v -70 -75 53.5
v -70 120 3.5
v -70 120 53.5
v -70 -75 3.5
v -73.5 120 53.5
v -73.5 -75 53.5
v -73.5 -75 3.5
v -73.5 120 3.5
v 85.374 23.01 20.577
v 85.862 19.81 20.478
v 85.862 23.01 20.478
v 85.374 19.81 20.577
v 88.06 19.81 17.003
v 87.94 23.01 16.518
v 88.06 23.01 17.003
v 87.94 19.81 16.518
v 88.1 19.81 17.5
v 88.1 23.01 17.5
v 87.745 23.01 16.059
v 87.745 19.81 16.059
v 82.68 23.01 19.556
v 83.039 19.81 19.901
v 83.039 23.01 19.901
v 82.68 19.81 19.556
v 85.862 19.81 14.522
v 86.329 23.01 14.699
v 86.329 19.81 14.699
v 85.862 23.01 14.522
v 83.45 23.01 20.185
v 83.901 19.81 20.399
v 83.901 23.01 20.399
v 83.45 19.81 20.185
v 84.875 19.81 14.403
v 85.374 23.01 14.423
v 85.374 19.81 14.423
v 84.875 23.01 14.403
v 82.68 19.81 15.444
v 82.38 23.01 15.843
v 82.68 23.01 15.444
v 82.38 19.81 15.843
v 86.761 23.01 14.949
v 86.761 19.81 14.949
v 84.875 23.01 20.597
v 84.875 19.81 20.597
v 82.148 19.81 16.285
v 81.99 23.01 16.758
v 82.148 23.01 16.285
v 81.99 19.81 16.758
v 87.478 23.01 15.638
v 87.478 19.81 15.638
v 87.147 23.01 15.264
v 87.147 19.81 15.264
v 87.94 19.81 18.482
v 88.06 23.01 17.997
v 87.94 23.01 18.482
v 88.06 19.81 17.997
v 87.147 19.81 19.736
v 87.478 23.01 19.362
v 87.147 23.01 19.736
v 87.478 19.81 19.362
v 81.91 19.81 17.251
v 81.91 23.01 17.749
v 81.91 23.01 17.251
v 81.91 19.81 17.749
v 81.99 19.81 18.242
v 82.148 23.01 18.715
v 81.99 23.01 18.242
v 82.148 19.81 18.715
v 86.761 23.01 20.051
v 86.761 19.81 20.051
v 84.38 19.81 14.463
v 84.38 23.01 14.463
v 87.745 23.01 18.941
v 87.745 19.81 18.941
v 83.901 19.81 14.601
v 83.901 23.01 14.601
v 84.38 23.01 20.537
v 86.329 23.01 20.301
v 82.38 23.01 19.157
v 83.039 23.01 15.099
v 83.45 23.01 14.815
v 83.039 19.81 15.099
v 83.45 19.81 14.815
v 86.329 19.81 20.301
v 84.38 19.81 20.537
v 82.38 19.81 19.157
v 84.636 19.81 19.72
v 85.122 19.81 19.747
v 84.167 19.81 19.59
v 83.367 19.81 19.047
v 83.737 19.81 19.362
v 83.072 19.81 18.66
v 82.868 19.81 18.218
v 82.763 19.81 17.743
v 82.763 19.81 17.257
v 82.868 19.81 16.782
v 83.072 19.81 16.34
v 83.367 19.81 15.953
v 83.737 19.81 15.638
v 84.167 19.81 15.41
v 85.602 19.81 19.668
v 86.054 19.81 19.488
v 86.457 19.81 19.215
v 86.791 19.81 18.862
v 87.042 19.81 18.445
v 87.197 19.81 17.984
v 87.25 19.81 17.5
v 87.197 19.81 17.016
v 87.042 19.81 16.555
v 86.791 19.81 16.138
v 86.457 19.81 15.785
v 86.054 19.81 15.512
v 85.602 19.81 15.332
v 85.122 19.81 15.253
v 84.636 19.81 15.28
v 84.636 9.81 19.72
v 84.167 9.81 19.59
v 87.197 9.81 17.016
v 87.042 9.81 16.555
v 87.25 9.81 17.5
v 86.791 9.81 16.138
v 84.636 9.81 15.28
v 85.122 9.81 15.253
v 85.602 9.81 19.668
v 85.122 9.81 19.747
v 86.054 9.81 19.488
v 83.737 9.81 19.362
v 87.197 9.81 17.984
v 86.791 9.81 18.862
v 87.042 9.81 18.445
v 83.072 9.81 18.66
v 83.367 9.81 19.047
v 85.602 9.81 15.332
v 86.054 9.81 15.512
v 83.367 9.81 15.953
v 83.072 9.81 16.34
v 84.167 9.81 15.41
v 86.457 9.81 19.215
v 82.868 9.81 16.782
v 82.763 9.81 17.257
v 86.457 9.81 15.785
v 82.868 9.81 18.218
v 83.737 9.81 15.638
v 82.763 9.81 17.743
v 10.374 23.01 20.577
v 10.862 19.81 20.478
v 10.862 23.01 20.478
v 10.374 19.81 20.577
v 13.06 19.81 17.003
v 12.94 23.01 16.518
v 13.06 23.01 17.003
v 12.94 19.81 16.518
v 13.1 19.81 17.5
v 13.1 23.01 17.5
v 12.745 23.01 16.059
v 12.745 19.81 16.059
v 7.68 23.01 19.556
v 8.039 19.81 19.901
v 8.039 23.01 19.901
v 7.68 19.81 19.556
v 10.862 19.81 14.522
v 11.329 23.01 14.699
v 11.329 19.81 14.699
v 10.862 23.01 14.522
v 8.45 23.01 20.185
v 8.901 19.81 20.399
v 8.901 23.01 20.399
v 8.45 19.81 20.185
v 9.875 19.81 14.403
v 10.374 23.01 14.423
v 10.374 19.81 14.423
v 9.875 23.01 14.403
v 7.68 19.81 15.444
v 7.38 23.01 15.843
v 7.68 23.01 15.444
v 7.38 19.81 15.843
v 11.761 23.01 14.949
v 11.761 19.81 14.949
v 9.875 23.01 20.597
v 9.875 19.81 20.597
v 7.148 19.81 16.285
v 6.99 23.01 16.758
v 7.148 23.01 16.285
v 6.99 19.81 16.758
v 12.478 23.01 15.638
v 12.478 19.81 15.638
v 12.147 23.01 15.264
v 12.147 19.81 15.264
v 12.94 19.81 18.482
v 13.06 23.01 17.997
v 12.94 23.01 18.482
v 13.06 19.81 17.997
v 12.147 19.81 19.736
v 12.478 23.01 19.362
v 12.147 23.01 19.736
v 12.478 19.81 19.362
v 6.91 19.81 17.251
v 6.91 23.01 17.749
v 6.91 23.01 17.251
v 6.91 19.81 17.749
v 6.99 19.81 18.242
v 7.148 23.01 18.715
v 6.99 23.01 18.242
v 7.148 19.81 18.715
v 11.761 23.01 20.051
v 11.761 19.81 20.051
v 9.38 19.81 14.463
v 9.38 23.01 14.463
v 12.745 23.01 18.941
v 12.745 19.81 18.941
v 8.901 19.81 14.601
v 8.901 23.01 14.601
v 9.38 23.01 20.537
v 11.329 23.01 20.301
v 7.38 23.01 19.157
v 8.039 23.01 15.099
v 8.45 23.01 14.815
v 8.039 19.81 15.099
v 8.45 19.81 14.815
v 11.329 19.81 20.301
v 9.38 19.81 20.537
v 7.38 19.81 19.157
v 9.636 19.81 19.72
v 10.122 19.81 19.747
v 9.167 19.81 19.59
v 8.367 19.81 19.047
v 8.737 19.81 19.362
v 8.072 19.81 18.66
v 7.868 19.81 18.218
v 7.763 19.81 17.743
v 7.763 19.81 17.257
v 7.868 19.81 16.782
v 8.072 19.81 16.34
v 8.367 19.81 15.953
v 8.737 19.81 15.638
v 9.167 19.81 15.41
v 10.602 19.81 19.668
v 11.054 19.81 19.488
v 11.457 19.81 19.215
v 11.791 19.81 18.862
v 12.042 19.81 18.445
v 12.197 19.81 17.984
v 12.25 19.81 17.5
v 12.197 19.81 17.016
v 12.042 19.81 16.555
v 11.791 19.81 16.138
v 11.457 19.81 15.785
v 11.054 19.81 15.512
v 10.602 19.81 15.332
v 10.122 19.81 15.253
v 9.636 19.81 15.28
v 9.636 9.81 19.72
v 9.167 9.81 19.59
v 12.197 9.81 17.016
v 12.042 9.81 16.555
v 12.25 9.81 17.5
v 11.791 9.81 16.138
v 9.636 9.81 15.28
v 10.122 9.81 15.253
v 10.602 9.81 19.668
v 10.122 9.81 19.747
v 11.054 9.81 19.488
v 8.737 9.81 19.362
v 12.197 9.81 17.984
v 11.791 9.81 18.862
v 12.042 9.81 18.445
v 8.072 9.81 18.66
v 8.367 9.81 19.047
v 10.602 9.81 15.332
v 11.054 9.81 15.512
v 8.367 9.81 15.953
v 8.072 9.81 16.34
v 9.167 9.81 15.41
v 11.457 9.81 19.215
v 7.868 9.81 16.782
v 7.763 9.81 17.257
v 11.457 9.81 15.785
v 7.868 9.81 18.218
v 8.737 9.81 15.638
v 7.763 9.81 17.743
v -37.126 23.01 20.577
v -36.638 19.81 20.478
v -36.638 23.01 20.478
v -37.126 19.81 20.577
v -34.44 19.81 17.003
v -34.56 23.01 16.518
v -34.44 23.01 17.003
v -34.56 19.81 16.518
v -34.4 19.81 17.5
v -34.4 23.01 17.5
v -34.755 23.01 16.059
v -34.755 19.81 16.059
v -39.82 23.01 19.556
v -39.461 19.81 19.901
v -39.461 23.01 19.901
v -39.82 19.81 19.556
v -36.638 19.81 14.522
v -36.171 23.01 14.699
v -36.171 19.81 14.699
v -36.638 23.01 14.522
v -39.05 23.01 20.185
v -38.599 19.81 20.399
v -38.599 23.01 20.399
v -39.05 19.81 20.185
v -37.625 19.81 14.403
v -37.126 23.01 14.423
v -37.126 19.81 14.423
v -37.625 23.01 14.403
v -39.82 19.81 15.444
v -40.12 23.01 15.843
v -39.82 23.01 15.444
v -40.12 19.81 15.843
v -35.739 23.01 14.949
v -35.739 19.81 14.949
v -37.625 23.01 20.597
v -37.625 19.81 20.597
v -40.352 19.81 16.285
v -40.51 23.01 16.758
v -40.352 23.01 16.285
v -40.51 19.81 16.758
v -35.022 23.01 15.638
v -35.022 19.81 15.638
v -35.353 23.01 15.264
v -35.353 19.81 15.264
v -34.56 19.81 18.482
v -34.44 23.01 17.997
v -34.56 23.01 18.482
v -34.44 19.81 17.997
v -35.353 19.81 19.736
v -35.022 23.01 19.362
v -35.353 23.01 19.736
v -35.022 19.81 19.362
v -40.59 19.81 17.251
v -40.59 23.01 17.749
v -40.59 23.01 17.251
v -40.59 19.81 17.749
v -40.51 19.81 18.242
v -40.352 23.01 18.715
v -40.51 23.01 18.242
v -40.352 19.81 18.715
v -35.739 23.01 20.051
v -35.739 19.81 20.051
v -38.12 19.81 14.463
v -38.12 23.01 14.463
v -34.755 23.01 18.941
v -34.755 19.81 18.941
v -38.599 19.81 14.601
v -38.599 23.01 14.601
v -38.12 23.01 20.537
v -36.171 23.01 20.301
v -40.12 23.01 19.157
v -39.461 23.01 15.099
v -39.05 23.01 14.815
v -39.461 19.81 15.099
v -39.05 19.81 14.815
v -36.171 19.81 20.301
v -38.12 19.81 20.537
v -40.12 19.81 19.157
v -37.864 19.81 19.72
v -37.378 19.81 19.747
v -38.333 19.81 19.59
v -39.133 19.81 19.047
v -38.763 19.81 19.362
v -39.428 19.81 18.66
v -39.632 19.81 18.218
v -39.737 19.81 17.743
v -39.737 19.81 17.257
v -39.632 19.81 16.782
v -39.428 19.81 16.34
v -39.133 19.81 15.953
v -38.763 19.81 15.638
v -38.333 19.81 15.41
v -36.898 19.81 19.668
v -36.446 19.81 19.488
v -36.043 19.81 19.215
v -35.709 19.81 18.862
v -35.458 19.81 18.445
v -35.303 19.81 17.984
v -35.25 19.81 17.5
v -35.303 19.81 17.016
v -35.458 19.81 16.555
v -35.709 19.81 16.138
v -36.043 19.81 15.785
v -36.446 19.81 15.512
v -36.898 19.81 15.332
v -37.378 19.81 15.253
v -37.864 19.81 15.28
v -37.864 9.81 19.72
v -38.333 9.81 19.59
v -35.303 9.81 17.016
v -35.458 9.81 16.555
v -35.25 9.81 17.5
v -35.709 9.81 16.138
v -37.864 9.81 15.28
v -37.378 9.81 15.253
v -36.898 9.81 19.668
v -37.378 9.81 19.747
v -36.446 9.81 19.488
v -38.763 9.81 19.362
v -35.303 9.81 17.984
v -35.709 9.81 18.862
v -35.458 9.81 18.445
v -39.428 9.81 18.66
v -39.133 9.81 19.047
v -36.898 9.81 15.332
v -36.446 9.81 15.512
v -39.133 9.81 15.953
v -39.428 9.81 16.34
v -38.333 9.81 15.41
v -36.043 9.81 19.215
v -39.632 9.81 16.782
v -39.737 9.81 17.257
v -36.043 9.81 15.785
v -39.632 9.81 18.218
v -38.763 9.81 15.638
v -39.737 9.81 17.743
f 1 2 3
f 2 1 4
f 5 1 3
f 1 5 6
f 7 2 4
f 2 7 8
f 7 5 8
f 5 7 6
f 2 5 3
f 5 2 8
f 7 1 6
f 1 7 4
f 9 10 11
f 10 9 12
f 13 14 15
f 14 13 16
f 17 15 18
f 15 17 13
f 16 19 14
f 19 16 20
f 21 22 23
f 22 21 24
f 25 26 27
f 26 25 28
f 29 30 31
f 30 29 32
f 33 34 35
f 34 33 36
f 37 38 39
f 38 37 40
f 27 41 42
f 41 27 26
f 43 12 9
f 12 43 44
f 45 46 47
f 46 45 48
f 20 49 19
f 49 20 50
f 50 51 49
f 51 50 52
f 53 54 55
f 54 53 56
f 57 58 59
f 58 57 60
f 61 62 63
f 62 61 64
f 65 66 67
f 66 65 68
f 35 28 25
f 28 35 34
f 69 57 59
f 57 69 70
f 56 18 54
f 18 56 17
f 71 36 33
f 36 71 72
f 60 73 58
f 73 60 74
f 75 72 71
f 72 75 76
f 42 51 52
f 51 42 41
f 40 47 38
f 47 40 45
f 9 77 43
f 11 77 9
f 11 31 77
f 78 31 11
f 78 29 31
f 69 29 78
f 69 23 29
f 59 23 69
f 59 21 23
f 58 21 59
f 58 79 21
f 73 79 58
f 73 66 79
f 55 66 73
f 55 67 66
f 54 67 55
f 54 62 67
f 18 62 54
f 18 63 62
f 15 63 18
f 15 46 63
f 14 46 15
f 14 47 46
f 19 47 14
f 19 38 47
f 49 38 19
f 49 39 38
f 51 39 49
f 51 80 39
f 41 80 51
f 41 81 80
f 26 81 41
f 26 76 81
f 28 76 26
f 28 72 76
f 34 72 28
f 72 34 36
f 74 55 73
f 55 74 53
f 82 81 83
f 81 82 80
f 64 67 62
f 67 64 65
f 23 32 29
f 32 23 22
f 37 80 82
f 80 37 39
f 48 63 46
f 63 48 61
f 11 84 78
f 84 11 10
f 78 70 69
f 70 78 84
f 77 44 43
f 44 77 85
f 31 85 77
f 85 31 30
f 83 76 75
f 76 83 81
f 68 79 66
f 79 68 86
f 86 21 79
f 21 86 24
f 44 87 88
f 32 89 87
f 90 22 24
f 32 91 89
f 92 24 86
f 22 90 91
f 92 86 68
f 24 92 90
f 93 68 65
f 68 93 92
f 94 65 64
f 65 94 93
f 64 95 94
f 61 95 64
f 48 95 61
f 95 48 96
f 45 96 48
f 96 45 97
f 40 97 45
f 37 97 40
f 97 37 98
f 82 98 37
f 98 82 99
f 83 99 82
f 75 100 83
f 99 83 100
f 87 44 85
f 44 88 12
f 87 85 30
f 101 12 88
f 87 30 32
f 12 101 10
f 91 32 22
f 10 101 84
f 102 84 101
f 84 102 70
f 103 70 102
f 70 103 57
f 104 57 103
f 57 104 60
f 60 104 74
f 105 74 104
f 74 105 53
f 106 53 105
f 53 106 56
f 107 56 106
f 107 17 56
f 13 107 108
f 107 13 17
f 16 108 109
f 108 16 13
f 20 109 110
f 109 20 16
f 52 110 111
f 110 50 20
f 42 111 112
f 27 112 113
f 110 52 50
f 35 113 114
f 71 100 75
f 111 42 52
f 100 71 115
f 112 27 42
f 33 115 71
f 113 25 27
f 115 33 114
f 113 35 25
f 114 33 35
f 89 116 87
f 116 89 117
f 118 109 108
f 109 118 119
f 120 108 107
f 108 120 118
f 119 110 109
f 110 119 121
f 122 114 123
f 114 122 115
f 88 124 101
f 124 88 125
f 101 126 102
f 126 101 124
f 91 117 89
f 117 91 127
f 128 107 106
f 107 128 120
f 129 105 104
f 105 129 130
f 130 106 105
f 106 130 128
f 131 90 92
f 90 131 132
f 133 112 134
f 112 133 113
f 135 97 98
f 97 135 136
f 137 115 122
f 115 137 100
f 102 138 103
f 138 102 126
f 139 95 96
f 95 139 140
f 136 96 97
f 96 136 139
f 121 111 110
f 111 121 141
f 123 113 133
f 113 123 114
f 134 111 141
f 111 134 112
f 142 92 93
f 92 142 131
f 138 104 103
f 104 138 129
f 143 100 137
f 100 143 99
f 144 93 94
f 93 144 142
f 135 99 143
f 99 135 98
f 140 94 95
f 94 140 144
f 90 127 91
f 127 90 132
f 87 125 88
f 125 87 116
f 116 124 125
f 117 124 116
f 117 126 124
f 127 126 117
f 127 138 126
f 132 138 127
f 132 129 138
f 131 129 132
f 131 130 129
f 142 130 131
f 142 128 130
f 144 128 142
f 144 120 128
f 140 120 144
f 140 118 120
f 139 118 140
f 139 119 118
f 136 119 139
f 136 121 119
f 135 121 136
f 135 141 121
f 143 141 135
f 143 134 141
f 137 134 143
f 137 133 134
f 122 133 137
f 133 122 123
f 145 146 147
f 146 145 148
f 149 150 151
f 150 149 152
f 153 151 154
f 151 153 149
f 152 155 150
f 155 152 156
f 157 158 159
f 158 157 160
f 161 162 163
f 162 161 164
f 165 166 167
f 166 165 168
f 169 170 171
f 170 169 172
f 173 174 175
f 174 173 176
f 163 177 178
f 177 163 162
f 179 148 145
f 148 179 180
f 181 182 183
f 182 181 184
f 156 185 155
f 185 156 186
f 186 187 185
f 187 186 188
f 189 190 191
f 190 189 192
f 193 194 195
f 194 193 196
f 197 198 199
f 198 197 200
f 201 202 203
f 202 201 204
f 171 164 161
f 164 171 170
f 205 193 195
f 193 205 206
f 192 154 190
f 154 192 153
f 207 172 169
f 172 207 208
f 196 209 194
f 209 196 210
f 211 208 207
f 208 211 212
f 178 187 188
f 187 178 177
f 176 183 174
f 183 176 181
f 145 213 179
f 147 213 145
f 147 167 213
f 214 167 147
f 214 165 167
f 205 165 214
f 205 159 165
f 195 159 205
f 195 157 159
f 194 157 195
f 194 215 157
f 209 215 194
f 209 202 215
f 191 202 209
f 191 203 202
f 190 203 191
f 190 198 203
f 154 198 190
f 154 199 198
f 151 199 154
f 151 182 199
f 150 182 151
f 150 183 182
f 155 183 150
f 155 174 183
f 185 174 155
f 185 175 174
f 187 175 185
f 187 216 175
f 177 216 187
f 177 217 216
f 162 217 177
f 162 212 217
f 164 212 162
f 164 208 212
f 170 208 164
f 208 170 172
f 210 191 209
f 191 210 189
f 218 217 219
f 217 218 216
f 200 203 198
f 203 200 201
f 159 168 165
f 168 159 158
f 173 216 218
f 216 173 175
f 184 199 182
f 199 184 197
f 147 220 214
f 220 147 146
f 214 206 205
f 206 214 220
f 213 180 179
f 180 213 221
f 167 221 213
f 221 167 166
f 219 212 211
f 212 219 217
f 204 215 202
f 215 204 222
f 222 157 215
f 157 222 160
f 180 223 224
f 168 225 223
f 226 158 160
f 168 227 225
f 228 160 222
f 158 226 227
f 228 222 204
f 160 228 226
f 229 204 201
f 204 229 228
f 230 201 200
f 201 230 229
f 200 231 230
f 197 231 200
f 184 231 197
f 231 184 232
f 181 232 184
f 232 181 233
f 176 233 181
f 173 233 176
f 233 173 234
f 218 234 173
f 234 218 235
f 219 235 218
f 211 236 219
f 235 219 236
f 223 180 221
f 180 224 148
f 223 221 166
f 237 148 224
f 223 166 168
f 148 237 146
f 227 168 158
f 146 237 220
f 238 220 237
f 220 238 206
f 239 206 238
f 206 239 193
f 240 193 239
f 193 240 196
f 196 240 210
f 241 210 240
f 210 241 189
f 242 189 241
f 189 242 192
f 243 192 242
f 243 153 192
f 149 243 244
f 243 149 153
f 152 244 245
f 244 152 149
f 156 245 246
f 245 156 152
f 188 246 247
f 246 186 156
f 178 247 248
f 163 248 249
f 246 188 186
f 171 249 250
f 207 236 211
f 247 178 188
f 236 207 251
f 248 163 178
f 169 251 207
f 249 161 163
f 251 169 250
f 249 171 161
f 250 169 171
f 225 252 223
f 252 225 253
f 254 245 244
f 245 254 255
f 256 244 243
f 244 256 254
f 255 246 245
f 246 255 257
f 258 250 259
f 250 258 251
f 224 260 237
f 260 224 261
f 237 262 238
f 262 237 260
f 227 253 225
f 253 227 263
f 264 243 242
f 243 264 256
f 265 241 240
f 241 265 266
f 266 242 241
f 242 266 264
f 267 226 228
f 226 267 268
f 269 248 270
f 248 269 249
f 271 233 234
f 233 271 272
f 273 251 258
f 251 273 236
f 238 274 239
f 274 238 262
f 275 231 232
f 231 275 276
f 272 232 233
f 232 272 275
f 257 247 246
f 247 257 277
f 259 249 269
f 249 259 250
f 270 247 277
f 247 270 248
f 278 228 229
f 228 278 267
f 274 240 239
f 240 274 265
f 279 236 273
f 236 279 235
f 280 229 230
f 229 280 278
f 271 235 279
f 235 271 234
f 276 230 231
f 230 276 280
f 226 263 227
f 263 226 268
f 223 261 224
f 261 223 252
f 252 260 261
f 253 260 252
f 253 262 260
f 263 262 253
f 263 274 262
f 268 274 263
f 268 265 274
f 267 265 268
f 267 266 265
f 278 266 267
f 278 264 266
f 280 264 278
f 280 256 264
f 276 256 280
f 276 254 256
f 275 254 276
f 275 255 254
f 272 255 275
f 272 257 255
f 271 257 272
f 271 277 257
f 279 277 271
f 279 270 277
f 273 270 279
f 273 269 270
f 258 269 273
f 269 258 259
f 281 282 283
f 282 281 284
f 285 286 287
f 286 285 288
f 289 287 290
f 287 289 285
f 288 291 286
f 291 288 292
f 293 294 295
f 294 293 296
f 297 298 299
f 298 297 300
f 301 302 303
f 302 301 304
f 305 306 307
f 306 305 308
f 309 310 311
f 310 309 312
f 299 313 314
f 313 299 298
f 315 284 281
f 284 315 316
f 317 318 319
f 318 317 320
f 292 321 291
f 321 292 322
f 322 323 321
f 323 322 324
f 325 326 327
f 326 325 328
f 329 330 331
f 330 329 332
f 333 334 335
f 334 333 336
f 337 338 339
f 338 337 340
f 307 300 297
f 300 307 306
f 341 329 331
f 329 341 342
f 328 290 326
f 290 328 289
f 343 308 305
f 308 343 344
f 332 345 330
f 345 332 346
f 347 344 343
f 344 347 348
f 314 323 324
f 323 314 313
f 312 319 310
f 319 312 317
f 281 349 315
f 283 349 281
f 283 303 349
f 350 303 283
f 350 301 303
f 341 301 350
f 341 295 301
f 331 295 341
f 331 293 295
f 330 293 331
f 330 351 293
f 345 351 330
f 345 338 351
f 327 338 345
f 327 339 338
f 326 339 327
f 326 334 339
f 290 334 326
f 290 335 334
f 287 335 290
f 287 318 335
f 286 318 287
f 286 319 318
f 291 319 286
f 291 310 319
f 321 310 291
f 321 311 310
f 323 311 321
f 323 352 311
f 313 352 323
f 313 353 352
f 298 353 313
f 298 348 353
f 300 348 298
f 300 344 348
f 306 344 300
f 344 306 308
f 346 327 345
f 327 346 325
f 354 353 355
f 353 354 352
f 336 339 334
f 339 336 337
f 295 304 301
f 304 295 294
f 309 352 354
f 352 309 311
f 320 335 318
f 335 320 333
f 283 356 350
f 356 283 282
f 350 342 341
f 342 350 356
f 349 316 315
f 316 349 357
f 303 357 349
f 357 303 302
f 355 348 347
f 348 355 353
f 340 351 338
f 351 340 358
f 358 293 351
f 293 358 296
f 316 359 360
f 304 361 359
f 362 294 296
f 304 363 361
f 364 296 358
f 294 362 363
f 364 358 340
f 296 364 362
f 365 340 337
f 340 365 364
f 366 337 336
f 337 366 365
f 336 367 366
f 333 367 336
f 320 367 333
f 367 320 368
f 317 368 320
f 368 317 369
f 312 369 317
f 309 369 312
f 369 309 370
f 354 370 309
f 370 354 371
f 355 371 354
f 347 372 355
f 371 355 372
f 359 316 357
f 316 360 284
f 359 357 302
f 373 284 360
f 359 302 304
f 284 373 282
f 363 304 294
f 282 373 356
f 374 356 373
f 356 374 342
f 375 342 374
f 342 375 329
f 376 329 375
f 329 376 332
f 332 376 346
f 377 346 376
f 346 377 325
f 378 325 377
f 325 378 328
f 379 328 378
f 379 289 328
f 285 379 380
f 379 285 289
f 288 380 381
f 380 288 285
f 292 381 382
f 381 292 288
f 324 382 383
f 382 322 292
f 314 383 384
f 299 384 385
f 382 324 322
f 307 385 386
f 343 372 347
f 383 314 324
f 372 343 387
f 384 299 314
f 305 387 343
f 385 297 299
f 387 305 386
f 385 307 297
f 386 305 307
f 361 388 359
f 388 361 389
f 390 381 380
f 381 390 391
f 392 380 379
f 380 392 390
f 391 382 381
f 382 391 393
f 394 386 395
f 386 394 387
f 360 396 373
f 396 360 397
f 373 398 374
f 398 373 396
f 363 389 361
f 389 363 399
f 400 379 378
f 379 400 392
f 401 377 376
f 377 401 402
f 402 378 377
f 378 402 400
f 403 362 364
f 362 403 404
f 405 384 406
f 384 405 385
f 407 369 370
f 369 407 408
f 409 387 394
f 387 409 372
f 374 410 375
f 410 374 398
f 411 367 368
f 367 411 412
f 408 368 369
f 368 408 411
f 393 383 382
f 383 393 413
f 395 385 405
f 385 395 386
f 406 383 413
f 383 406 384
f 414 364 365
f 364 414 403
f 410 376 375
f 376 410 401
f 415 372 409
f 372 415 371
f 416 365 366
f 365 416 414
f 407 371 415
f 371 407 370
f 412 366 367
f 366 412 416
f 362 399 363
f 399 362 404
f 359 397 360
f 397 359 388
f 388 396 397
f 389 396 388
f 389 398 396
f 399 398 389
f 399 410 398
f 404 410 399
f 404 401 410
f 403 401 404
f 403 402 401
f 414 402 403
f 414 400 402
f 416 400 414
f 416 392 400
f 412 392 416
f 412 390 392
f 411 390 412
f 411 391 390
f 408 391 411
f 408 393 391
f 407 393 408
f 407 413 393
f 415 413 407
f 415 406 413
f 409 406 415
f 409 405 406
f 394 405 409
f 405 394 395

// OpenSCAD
// file: lib/Metric/Polygon.scad
//============================================================
// OpenSCAD
// Regular Convex Polygon Library
// Last Modified : 2015/10/28
//============================================================
/*

	Definition

	N = Number of Side N >=3
	A = apothem
		radius of inside circle
	R = circumradius
		Radius of outside circle
	S = Side
		Lenght of a side

	Build polygon with the Apothem :
	N and A is known
	Need to calculate S then R
	use $fn

	Build Polygon with Circumradius
	N and R known
	use $fn

	Build Polygon with Side
	N and S Known
	Need to calculate R and optionaly A
	use $fn	

	TO DO
    Control result

	For more information :
	http://en.wikipedia.org/wiki/Regular_polygon

*/

//------------------------------------------------------------
//
//------------------------------------------------------------
Demo();

//------------------------------------------------------------
// Demo
//------------------------------------------------------------
module Demo()
{
	inch = 25.4;	// 25.4mm
	// A = apothem - it's a RADIUS !
	// For a bolt of 4 inches spécify A=2*inch
	//Polygon(N=7,A=2*inch,h=0);	// 4 inches radius Polygon
	//Polygon(N=7,A=49.8365,h=0);
	//Trigon(A=50,h=10);			// N=3
	//Dodecagon(A=50,h=0);			// N=12

    //rotate([0,0,360/7/2])
	//Nonagon(R=55.3144,h=10,debug=true);

	//Polygon(N=6,A=60,h=0,debug=false);
	//Polygon(N=6,A=60,h=5,debug=true);

    Enneagon(A=50);
}


//------------------------------------------------------------
// Polygon : 
//------------------------------------------------------------
module Polygon(N=3,A=0,R=0,S=0,h=0,debug=false)
{
	N = ( N < 3 ? 3 : N );

	angle = 360/N;
	angleA = angle/2;

	if (debug)
	{
		echo("N = ", N);
		echo("A = ", A);
		echo("S = ", S);
		echo("R = ", R);
	}

	if ( A > 0 )		// if A assign R and S
	{
        S = 2 * A * tan(angleA);							// assign
		//R = (S/2) / sin(angleA);						// no assign ???
		R = ( A * tan(angleA) ) / sin(angleA);		// asign
		_Build_Polygon(N=N,R=R,h=h);
		if (debug)
		{
			echo("aN = ", N);
			echo("aA = ", A);
			echo("aS = ", S);
			echo("aR = ", R);
			#cylinder(r=A,h=h+1,center=true,$fn=150);
			%cylinder(r=R,h=h+1,center=true,$fn=150);
		}
	}
	else
	{
		if ( S > 0 )		// if S assign R and A
		{
			R = (S/2) / sin(angleA);			// assign
			A = S / ( 2 * tan(angleA) );		// assign
            _Build_Polygon(N=N,R=R,h=h);
			if (debug)
			{
				echo("sN = ", N);
				echo("sA = ", A);
				echo("sS = ", S);
				echo("sR = ", R);
				#cylinder(r=A,h=h+1,center=true,$fn=150);
				%cylinder(r=R,h=h+1,center=true,$fn=150);
			}
		}
		else
		{
			if ( R == 0 )		// default
			{
				S = 2 * R * sin(angleA);			// no assign ???
				A = S / ( 2 * tan(angleA) );		// no assign ???
				_Build_Polygon(N=N,h=h);
				if (debug)
				{
					echo("0N = ", N);
					echo("0A = ", A);
					echo("0S = ", S);
					echo("0R = ", R);
					#cylinder(r=A,h=h+1,center=true,$fn=150);
					%cylinder(r=R,h=h+1,center=true,$fn=150);
				}
			}
			else		// build with R
			{
				S = 2 * R * sin(angleA);
				A = S / ( 2 * tan(angleA) );			// no assign ???
				//A = R * ( sin(angleA) / tan(angleA) )	// no assign ???
				_Build_Polygon(N=N,R=R,h=h);
				if (debug)
				{
					echo("rN = ", N);
					echo("rA = ", A);
					echo("rS = ", S);
					echo("rR = ", R);
					%cylinder(r=R,h=h+1,center=true,$fn=150);
				}
			}
		}
	}

	if (debug)
	{
		echo("fN = ", N);
		echo("fA = ", A);
		echo("fS = ", S);
		echo("fR = ", R);
	}
}

//------------------------------------------------------------
// Build
//------------------------------------------------------------
module _Build_Polygon(N=3,R=1,h=0)
{
	if (h > 0)
	{
		// 3D primitive h>0
		cylinder(r=R,h=h,$fn=N,center=true);
	}
	else
	{
		// 2D primitive h=0
		circle(r=R,$fn=N,center=true);
	}
}

//------------------------------------------------------------
// Building lots from N=3, N=N+1
// http://en.wikipedia.org/wiki/Polygon
//------------------------------------------------------------

// 3 sides
module Trigon(A=0,R=0,S=0,h=0,debug=false)
	{Polygon(N=3,A=A,R=R,S=S,h=h,debug=debug);}

module Triangle(A=0,R=0,S=0,h=0,debug=false)
	{Polygon(N=3,A=A,R=R,S=S,h=h,debug=debug);}

// 4 sides
module Tetragon(A=0,R=0,S=0,h=0,debug=false)
	{Polygon(N=4,A=A,R=R,S=S,h=h,debug=debug);}

module Quadrilateral(A=0,R=0,S=0,h=0,debug=false)
	{Polygon(N=4,A=A,R=R,S=S,h=h,debug=debug);}

module Quadrangle(A=0,R=0,S=0,h=0,debug=false)
	{Polygon(N=4,A=A,R=R,S=S,h=h,debug=debug);}

// 5 sides
module Pentagon(A=0,R=0,S=0,h=0,debug=false)
	{Polygon(N=5,A=A,R=R,S=S,h=h,debug=debug);}

// 6 sides
module Hexagon(A=0,R=0,S=0,h=0,debug=false)
	{Polygon(N=6,A=A,R=R,S=S,h=h,debug=debug);}

// 7 sides
module Heptagon(A=0,R=0,S=0,h=0,debug=false)
	{Polygon(N=7,A=A,R=R,S=S,h=h,debug=debug);}

// 8 sides
module Octagon(A=0,R=0,S=0,h=0,debug=false)
	{Polygon(N=8,A=A,R=R,S=S,h=h,debug=debug);}

// 9 sides
module Enneagon(A=0,R=0,S=0,h=0,debug=false)
	{Polygon(N=9,A=A,R=R,S=S,h=h,debug=debug);}

module Nonagon(A=0,R=0,S=0,h=0,debug=false)
	{Polygon(N=9,A=A,R=R,S=S,h=h,debug=debug);}

// 10 sides
module Decagon(A=0,R=0,S=0,h=0,debug=false)
	{Polygon(N=10,A=A,R=R,S=S,h=h,debug=debug);}

// 11 sides
module Handecagon(A=0,R=0,S=0,h=0,debug=false)
	{Polygon(N=11,A=A,R=R,S=S,h=h,debug=debug);}

// 12 sides
module Dodecagon(A=0,R=0,S=0,h=0,debug=false)
	{Polygon(N=12,A=A,R=R,S=S,h=h,debug=debug);}

// ...

// 100 sides
module Hectogon(A=0,R=0,S=0,h=0,debug=false)
	{Polygon(N=100,A=A,R=R,S=S,h=h,debug=debug);}

//==EOF=======================================================
// file: Metric/Polygon.scad
//============================================================
// OpenSCAD
// Regular Convex Polygon Library
// Last Modified : 2015/10/28
//============================================================
/*

	Definition

	N = Number of Side N >=3
	A = apothem
		radius of inside circle
	R = circumradius
		Radius of outside circle
	S = Side
		Lenght of a side

	Build polygon with the Apothem :
	N and A is known
	Need to calculate S then R
	use $fn

	Build Polygon with Circumradius
	N and R known
	use $fn

	Build Polygon with Side
	N and S Known
	Need to calculate R and optionaly A
	use $fn	

	TO DO
    Control result

	For more information :
	http://en.wikipedia.org/wiki/Regular_polygon

*/

//------------------------------------------------------------
//
//------------------------------------------------------------
Demo();

//------------------------------------------------------------
// Demo
//------------------------------------------------------------
module Demo()
{
	inch = 25.4;	// 25.4mm
	// A = apothem - it's a RADIUS !
	// For a bolt of 4 inches spécify A=2*inch
	//Polygon(N=7,A=2*inch,h=0);	// 4 inches radius Polygon
	//Polygon(N=7,A=49.8365,h=0);
	//Trigon(A=50,h=10);			// N=3
	//Dodecagon(A=50,h=0);			// N=12

    //rotate([0,0,360/7/2])
	//Nonagon(R=55.3144,h=10,debug=true);

	//Polygon(N=6,A=60,h=0,debug=false);
	//Polygon(N=6,A=60,h=5,debug=true);

    Enneagon(A=50);
}


//------------------------------------------------------------
// Polygon : 
//------------------------------------------------------------
module Polygon(N=3,A=0,R=0,S=0,h=0,debug=false)
{
	N = ( N < 3 ? 3 : N );

	angle = 360/N;
	angleA = angle/2;

	if (debug)
	{
		echo("N = ", N);
		echo("A = ", A);
		echo("S = ", S);
		echo("R = ", R);
	}

	if ( A > 0 )		// if A assign R and S
	{
        S = 2 * A * tan(angleA);							// assign
		//R = (S/2) / sin(angleA);						// no assign ???
		R = ( A * tan(angleA) ) / sin(angleA);		// asign
		_Build_Polygon(N=N,R=R,h=h);
		if (debug)
		{
			echo("aN = ", N);
			echo("aA = ", A);
			echo("aS = ", S);
			echo("aR = ", R);
			#cylinder(r=A,h=h+1,center=true,$fn=150);
			%cylinder(r=R,h=h+1,center=true,$fn=150);
		}
	}
	else
	{
		if ( S > 0 )		// if S assign R and A
		{
			R = (S/2) / sin(angleA);			// assign
			A = S / ( 2 * tan(angleA) );		// assign
            _Build_Polygon(N=N,R=R,h=h);
			if (debug)
			{
				echo("sN = ", N);
				echo("sA = ", A);
				echo("sS = ", S);
				echo("sR = ", R);
				#cylinder(r=A,h=h+1,center=true,$fn=150);
				%cylinder(r=R,h=h+1,center=true,$fn=150);
			}
		}
		else
		{
			if ( R == 0 )		// default
			{
				S = 2 * R * sin(angleA);			// no assign ???
				A = S / ( 2 * tan(angleA) );		// no assign ???
				_Build_Polygon(N=N,h=h);
				if (debug)
				{
					echo("0N = ", N);
					echo("0A = ", A);
					echo("0S = ", S);
					echo("0R = ", R);
					#cylinder(r=A,h=h+1,center=true,$fn=150);
					%cylinder(r=R,h=h+1,center=true,$fn=150);
				}
			}
			else		// build with R
			{
				S = 2 * R * sin(angleA);
				A = S / ( 2 * tan(angleA) );			// no assign ???
				//A = R * ( sin(angleA) / tan(angleA) )	// no assign ???
				_Build_Polygon(N=N,R=R,h=h);
				if (debug)
				{
					echo("rN = ", N);
					echo("rA = ", A);
					echo("rS = ", S);
					echo("rR = ", R);
					%cylinder(r=R,h=h+1,center=true,$fn=150);
				}
			}
		}
	}

	if (debug)
	{
		echo("fN = ", N);
		echo("fA = ", A);
		echo("fS = ", S);
		echo("fR = ", R);
	}
}

//------------------------------------------------------------
// Build
//------------------------------------------------------------
module _Build_Polygon(N=3,R=1,h=0)
{
	if (h > 0)
	{
		// 3D primitive h>0
		cylinder(r=R,h=h,$fn=N,center=true);
	}
	else
	{
		// 2D primitive h=0
		circle(r=R,$fn=N,center=true);
	}
}

//------------------------------------------------------------
// Building lots from N=3, N=N+1
// http://en.wikipedia.org/wiki/Polygon
//------------------------------------------------------------

// 3 sides
module Trigon(A=0,R=0,S=0,h=0,debug=false)
	{Polygon(N=3,A=A,R=R,S=S,h=h,debug=debug);}

module Triangle(A=0,R=0,S=0,h=0,debug=false)
	{Polygon(N=3,A=A,R=R,S=S,h=h,debug=debug);}

// 4 sides
module Tetragon(A=0,R=0,S=0,h=0,debug=false)
	{Polygon(N=4,A=A,R=R,S=S,h=h,debug=debug);}

module Quadrilateral(A=0,R=0,S=0,h=0,debug=false)
	{Polygon(N=4,A=A,R=R,S=S,h=h,debug=debug);}

module Quadrangle(A=0,R=0,S=0,h=0,debug=false)
	{Polygon(N=4,A=A,R=R,S=S,h=h,debug=debug);}

// 5 sides
module Pentagon(A=0,R=0,S=0,h=0,debug=false)
	{Polygon(N=5,A=A,R=R,S=S,h=h,debug=debug);}

// 6 sides
module Hexagon(A=0,R=0,S=0,h=0,debug=false)
	{Polygon(N=6,A=A,R=R,S=S,h=h,debug=debug);}

// 7 sides
module Heptagon(A=0,R=0,S=0,h=0,debug=false)
	{Polygon(N=7,A=A,R=R,S=S,h=h,debug=debug);}

// 8 sides
module Octagon(A=0,R=0,S=0,h=0,debug=false)
	{Polygon(N=8,A=A,R=R,S=S,h=h,debug=debug);}

// 9 sides
module Enneagon(A=0,R=0,S=0,h=0,debug=false)
	{Polygon(N=9,A=A,R=R,S=S,h=h,debug=debug);}

module Nonagon(A=0,R=0,S=0,h=0,debug=false)
	{Polygon(N=9,A=A,R=R,S=S,h=h,debug=debug);}

// 10 sides
module Decagon(A=0,R=0,S=0,h=0,debug=false)
	{Polygon(N=10,A=A,R=R,S=S,h=h,debug=debug);}

// 11 sides
module Handecagon(A=0,R=0,S=0,h=0,debug=false)
	{Polygon(N=11,A=A,R=R,S=S,h=h,debug=debug);}

// 12 sides
module Dodecagon(A=0,R=0,S=0,h=0,debug=false)
	{Polygon(N=12,A=A,R=R,S=S,h=h,debug=debug);}

// ...

// 100 sides
module Hectogon(A=0,R=0,S=0,h=0,debug=false)
	{Polygon(N=100,A=A,R=R,S=S,h=h,debug=debug);}

//==EOF=======================================================
// file: TopMidi.scad
use <buttons.scad>;

caseThickness = 3.5;

box = [135,195,45];

difference(){
        translate([0,0,caseThickness/2])
        cube([box[0],box[1], caseThickness],true);
    
        TopMidi();
}

module TopMidi(){
        translate([-25,0,0])
        rotate([0,0,-90])
            keyHole(type="5070MIDIC",holes=3);
        translate([25,0,0])
            rotate([0,0,-90])
                keyHole(type="5070MIDIF",holes=3);

        //rotate([0,0,-90])
        drillHoleOffset(PCBLength=101,offsetX=0,offsetY=8);
        drillHoleOffset(PCBLength=101,offsetX=0,offsetY=-23);
}
// file: TopScreen.scad
use <buttons.scad>;

caseThickness = 3.5;

box = [140,195,45];
top = [box[0],box[1],caseThickness];
screen = [86,56,2];
screenView = [77,52,5.1];



difference(){
        translate([0,0,caseThickness/2])
        cube([box[0],box[1], caseThickness],true);
        TopScreen();
        TopEncoder();
        TopKey();
}

module TopEncoder(){
    translate([61,21,0])
    rotate([0,0,90])
        encoderRow(1,16); 

    translate([61,-20,0])
    rotate([0,0,90])
        encoderRow(1,16);
        
    translate([-58,0,0])
    rotate([0,0,90])
        encoderRow(1,25);
}

module TopKey(){
        translate([-30,-55,0])
            keyHole(type="4060",holes=3);

        translate([30,-55,0]){
            keyHole(type="4060",holes=3);
        rotate([0,0,90]){
            drillHoleOffset(PCBLength=40,offsetY=30);
            drillHoleOffset(PCBLength=40,offsetY=-18);
            drillHoleOffset(PCBLength=40,offsetY=83);
        }
    }
        
        drillHoleOffset(PCBLength=120,offsetY=-54);

}

module TopScreen(){
        
        translate([0,2,3])
            cube(screen,true);
        translate([-2.5,2,0])
            cube(screenView,true);
    
        //drillHoleOffset(PCBLength=86,offsetY=17);
        drillHoleOffset(PCBLength=86,offsetY=-1);

    
}    
    
    
// file: lib/Metric/Bolt.scad
include <defaults.scad>;

module Bolt(
  l=10,
  h_head=5,
  d_head=10,
  d=5,
  tolerance=default_metric_tolerance,
  inset=1,
  extra_tolerance=default_bolt_extra_tolerance
) {
  r_head = d_head/2;
  r = d/2;

  translate([0, 0, -inset*h_head]){
    translate([0, 0, 0.01])
    cylinder(r=r_head+tolerance*2, h=h_head);

    translate([0, 0, -l+0.01])
    cylinder(r=r+tolerance*2+extra_tolerance, h=l+0.01);
  }
}
// file: lib/Metric/Nut.scad
include <defaults.scad>;
use <Polygon.scad>;

module Nut(
  h=10,
  l=10,
  A=10,
  d=5,
  tolerance=default_metric_tolerance,
  extra_tolerance=default_bolt_extra_tolerance,
  inset=1
) {
  r = d/2;  
  translate([0, 0, -h/2+0.01+((1-inset)*h)])
  Hexagon(
    A=A+tolerance,
    h=h+tolerance*2
  );
    
    translate([0, 0, -l+0.01])
    cylinder(r=r+tolerance*2+extra_tolerance, h=l+0.01);
}
// file: lib/Metric/defaults.scad
default_metric_tolerance = 0.2;
default_bolt_extra_tolerance = 0.35;
// file: Metric/Bolt.scad
include <defaults.scad>;

module Bolt(
  l=10,
  h_head=5,
  d_head=10,
  d=5,
  tolerance=default_metric_tolerance,
  inset=1,
  extra_tolerance=default_bolt_extra_tolerance
) {
  r_head = d_head/2;
  r = d/2;

  translate([0, 0, -inset*h_head]){
    translate([0, 0, 0.01])
    cylinder(r=r_head+tolerance*2, h=h_head);

    translate([0, 0, -l+0.01])
    cylinder(r=r+tolerance*2+extra_tolerance, h=l+0.01);
  }
}
// file: Metric/Nut.scad
include <defaults.scad>;
use <Polygon.scad>;

module Nut(
  h=10,
  l=10,
  A=10,
  d=5,
  tolerance=default_metric_tolerance,
  extra_tolerance=default_bolt_extra_tolerance,
  inset=1
) {
  r = d/2;  
  translate([0, 0, -h/2+0.01+((1-inset)*h)])
  Hexagon(
    A=A+tolerance,
    h=h+tolerance*2
  );
    
    translate([0, 0, -l+0.01])
    cylinder(r=r+tolerance*2+extra_tolerance, h=l+0.01);
}
// file: Metric/defaults.scad
default_metric_tolerance = 0.2;
default_bolt_extra_tolerance = 0.35;
// file: TopAssemble.scad
use <buttons.scad>;
use <case.scad>;
use <TopScreen.scad>;
use <TopMidi.scad>;

width = 140;
topLength = 120;
bottomLength = 75;
caseThickness = 3.5;

translate([0,topLength/2 ,0])
frontTopPart();

translate([0,-bottomLength/2,0])
frontBottomPart();

//rotate([0,0,90])
//sideLeft();

module frontTopPart(){

    difference(){
        rotate([0,0,180])
                roundRect([width,topLength,caseThickness],r=caseThickness,upper=false);

        translate([0,25,0]){
            TopScreen();
            TopEncoder();
            TopKey();
          
        }
        drillHoleOffset(PCBLength=110,offsetY=-topLength/2+ 5,offsetX=-2.5);
    }
    screwMount(width,mountWidth=12,offsetY= 25);
    screwMount(width,offsetY= -50);
    rotate([0,0,90])
    screwMount(topLength,offsetY= 0,single=true);

}

module frontBottomPart(){

    difference(){
        roundRect([width,bottomLength,caseThickness],r=caseThickness,upper=false);
        translate([0,2.5,0]){
            TopMidi();
          
        }
        drillHoleOffset(PCBLength=110,offsetY=bottomLength/2 - 5,offsetX=-2.5);     
    }
    screwMount(width,offsetY= 0);
    rotate([0,0,-90])
    screwMount(bottomLength,offsetY= 0,single=true);
}
// file: lib/rpi3.scad
//
// raspberry pi model B+
//
// design by Egil Kvaleberg, 8 Aug 2015
// Rasoberrypi 3 adapt by Guy Sheffer 28 Apr 2016
//
// drawing of the B+ model, for referrence:
// https://www.raspberrypi.org/documentation/hardware/raspberrypi/mechanical/Raspberry-Pi-B-Plus-V1.2-Mechanical-Drawing.pdf
//
// notes:
// design origin is middle of PCB
//

/* [Hidden] */
mil2mm = 0.0254;
pcb = [85.0, 56.0, 1.5]; // main board
pcb2floor = 4.0; // 3.5
pcb2roof = 17.0; // 15.7

pcbmntdia = 2.75; // mounting holes
pcbmnt1dx = pcb[0]/2 - 3.5;  // 
pcbmnt1dy = 3.5 - pcb[1]/2;
pcbmnt2dx = pcb[0]/2 - 3.5 - 58.0; // 
pcbmnt2dy = pcb[1]/2 - 3.5;
pcbmnthead = 6.2; // countersunk
pcbmntthreads = 2.2;

cardsy = 12.0; // card measures 11.0
cardsz = 3.1;
cardsx = 8.0; // size of internal platform
carddy = pcb[1]/2 - 28.0;
ethersy = 16.0; // ethernet contact width
ethersz = 13.5 + 0.5;
etherdy = pcb[1]/2 - 10.25;
usbsy = 13.5; // core
usbframe = 1.0; // frame
usbsz = 15.8 + 0.5;
usb1dy = pcb[1]/2 - 29.0;
usb2dy = pcb[1]/2 - 47.0;
powerpsx = 11.0; // power plug width 
powerpsz = 4.5; // plug height
powerssx = 8.0; // power socket width 
powerssz = 3.3; // socket height
powerdz = -1.7; // for plug 
powerdx = pcb[0]/2 - 10.6; // 
hdmisx = 15.2; // hdmi contact width
hdmisz = 6.2;
hdmipsx = 25.0; // typical plug
hdmipsz = 12.0;
hdmidx = pcb[0]/2 - 32.0;
audior = 7.0; // audio contact radius
audiodz = 6.0/2; // above pcb
audiodx = pcb[0]/2 -53.5;
d = 0.01;

frame_w = pcb[2] -d; // width of lip for frame 

tol = 0.5; // general tolerance
wall = 1.2; // general wall thickness
breakaway = 0.3; // have hidden hole for screw, 0 for no extra pegs 

raspberryMount(true);
raspberryPlugs();
            

module raspberryMount(show = false){
    for (dx = [pcbmnt1dx,pcbmnt2dx]) for (dy = [pcbmnt1dy,pcbmnt2dy]) 
    pedestal(dx, dy , pcb2floor, pcbmntdia );
    if(show)
        translate([0,0,pcb2floor + pcb[2]*0.5])cube([2*tol+pcb[0], 2*tol+pcb[1], pcb[2]+d],true);
}

module raspberryPlugs(){
    translate([0,0,pcb2floor+pcb[2] ]) plugs(tol);
}
        
module c_cube(x, y, z) {
	translate([-x/2, -y/2, 0]) cube([x, y, z]);
}

module pedestal(dx, dy, hg, dia) {
    translate([dx, dy, 0]) {
				cylinder(r = dia/2+wall, h = hg, $fs=0.2);
                // pegs through pcb mount holes
                if (breakaway > 0) translate([0, 0, hg]) 
                        cylinder(r = dia/2 - tol, h = pcb[2]+d, $fs=0.2);
            }
        }
        

module plugs(extra) { 
        module usb_plug(dy) {
            translate([-pcb[0]/2, dy, -extra-frame_w]) 
				c_cube(19.9, usbsy+2*extra, usbsz+2*extra+frame_w);
            translate([-pcb[0]/2 -19.9/2, dy, -extra-frame_w]) 
				c_cube(19.9, usbsy+2*usbframe+2*extra, usbsz+2*extra+frame_w+2*usbframe/2);
        }
        // card slot
        translate([pcb[0]/2, carddy, -cardsz-extra - 1.2]) // fudge 
			c_cube(19.9, cardsy+2*extra, cardsz+2*extra);
        // power socket (near side)
        translate([powerdx, pcb[1]/2, -extra-frame_w]) 
			c_cube(powerssx+2*extra, 19.9, powerssz+2*extra+frame_w);
        // room for power plug
        translate([powerdx, pcb[1]/2+9.9/2+wall*1.4, -extra-frame_w]) 
			c_cube(powerpsx+2*extra, 9.9, powerpsz+2*extra+frame_w);
       // ether plug 
        translate([-pcb[0]/2, etherdy, -extra-frame_w]) 
			c_cube(19.9, ethersy+2*extra, ethersz+2*extra+frame_w); // use half tol horizontally, seems to be enough
       // usb plugs
       usb_plug(usb1dy);
       usb_plug(usb2dy);
        // hdmi socket (near side)
        translate([hdmidx, pcb[1]/2, -extra-frame_w]) 
			c_cube(hdmisx+2*extra, 19.9, hdmisz+2*extra+frame_w);
        translate([hdmidx, pcb[1]/2+19.9/2-7.8/2, -extra-frame_w]) 
			c_cube(hdmipsx+2*extra, 7.8, hdmipsz+2*extra+frame_w);
        // audio plug (near side)
        translate([audiodx, pcb[1]/2 + 19.9/2, audiodz]) 
			rotate([90, 0, 0]) cylinder(r=audior/2+extra, h=19.9, $fn=20);
        translate([audiodx, pcb[1]/2, -extra-frame_w]) 
			c_cube(audior+2*extra, 19.9, audiodz+2*extra+frame_w);

    }
// file: lib/Metric/M3.scad
include <defaults.scad>;
use <Nut.scad>;
use <Bolt.scad>;

h_nut_m3 = 2.25;
a_nut_m3 = 5.4;
A_nut_m3 = a_nut_m3 / 2;
d_head_m3 = 5.4;
h_head_m3 = 3.2;
d_m3 = 3;

module NutM3(tolerance=default_metric_tolerance, h=h_nut_m3, inset=1,l=10) {
  Nut(h=h, l=l,A=A_nut_m3,d=d_m3, tolerance=tolerance, inset=inset);
}

module BoltM3(l=10, tolerance=default_metric_tolerance, inset=1) {
  Bolt(l=l, h_head=h_head_m3, d_head=d_head_m3, d=d_m3, tolerance=tolerance, inset=inset);
}
// file: Metric/M3.scad
include <defaults.scad>;
use <Nut.scad>;
use <Bolt.scad>;

h_nut_m3 = 2.25;
a_nut_m3 = 5.4;
A_nut_m3 = a_nut_m3 / 2;
d_head_m3 = 5.4;
h_head_m3 = 3.2;
d_m3 = 3;

module NutM3(tolerance=default_metric_tolerance, h=h_nut_m3, inset=1,l=10) {
  Nut(h=h, l=l,A=A_nut_m3,d=d_m3, tolerance=tolerance, inset=inset);
}

module BoltM3(l=10, tolerance=default_metric_tolerance, inset=1) {
  Bolt(l=l, h_head=h_head_m3, d_head=d_head_m3, d=d_m3, tolerance=tolerance, inset=inset);
}
// file: case.scad
include <lib/Metric/M3.scad>;
use <lib/rpi3.scad>;
use <TopAssemble.scad>;
    
caseThickness = 3.5;

box = [145,190,50];
top = [box[0],box[1],caseThickness];

width = 140;
topLength = 120;
bottomLength = 75;
caseThickness = 3.5;

sideHolesTop = 1;
topTopHolesOffset = [0,0];
topBotHolesOffset = [10,0];
bottomTopHolesOffset = [-35,0];
bottomBotHolesOffset = [-35,0];


$fs = 0.5;
$fa = 2;

translate([0,topLength/2 ,box[2] + 2*caseThickness])
rotate([0,180,0])
frontTopPart();

translate([0,-bottomLength/2,box[2] + 2*caseThickness])
rotate([0,180,0])
frontBottomPart();

difference(){
    union(){
        translate([0,topLength/2 ,0])
            bottomTop();
        translate([0,bottomLength/-2,0])
            bottomBottom();
        
        translate([0,(topLength-bottomLength)/2,0])
        rotate([0,0,90])screwMount(box[1]);

        
        translate()
            sideRounded();
        
        side(length=box[1],heigth=box[2]);
        
        translate([-32,box[1]/2 - 5,0])
            raspberryMount(); 
    }
    
    translate([0,0,box[2]/2])sideLeftHoles();
    
    
    screwHole(offsetY=-37.5,offsetX=box[0]/-2,offsetZ=caseThickness + 7.5,side=-1);
    
    screwHole(offsetY=25,offsetX=box[0]/-2,offsetZ=caseThickness + 7.5,side=-1);
    
    color("blue"){
        translate([-32,box[1]/2 - 3,0]){ 
            raspberryPlugs(); 
    
            }
        }
}
 

module bottomTop(){
        rotate([0,0,180])
         roundRect([width,topLength,caseThickness],r=caseThickness,upper=false);
        screwMount(box[0] - caseThickness,offsetY= bottomTopHolesOffset[0]);
    

}

module bottomBottom(){
         roundRect([width,bottomLength,caseThickness],r=caseThickness,upper=false);
        screwMount(box[0] - caseThickness,offsetY=0);

}
    
module roundRect(size, r, upper=true,center=true){
    if(!upper){
        hull(){
            for(i = [-1,1]){
                translate([size[0]/2*i,size[1]/2 - r,r/2])
                    cube([2*r,2*r,r],true); 
            }
       
            for(i = [-1,1]){
                translate([size[0]/2 *i,-size[1]/2,0])
                    linear_extrude(height = r)
                    circle(r);    
            }       
        }
    }
    else{
        hull(){
    for(i = [-1,1]){
        translate([size[0]/2*i,size[1]/2,0])
        linear_extrude(height = caseThickness)
            circle(caseThickness);    
    }
       
    for(i = [-1,1]){
        translate([size[0]/2 *i,-size[1]/2,0])
        linear_extrude(height = caseThickness)
        circle(caseThickness);    
        }
        }
    }
 }
 
 module screwHole(offsetX=0,offsetY=0,offsetZ=0,side=1){ 
        
            translate([offsetX,offsetY,offsetZ])
                rotate([0,side*90,0])
                    BoltM3(inset=0);
}
 
 
 module screwMount(width,mountWidth=15,caseThickness=3.5,offsetY=0,single=false){
     if(!single){
      for(i = [-1,1]){
            translate([width/2 *i - i*caseThickness/2 ,offsetY,15/2+ caseThickness]){
           difference(){
                cube([caseThickness,mountWidth,15],true);
                translate([i*-2,0,0])
                rotate([0,i*-90,0])
                NutM3();
           }
         }
     }
 }
     else{
         i = 1;
          translate([width/2 *i - i*caseThickness/2 ,offsetY,mountWidth/2+ caseThickness]){
           difference(){
                cube([caseThickness,mountWidth,15],true);
                translate([i*-2,0,0])
                rotate([0,i*-90,0])
                NutM3();

           }
         }  
     }
 }

//caseClip();
module caseClip(){
    difference(){
    cube([20,7,caseThickness],true);
    translate([5,0,+2])
        NutM3();
    translate([-5,0,+2])
        NutM3();
            
    }
    }

module sideLeftHoles(offsetY=21){
translate([box[0]/-2 -3,topLength/2,offsetY])
{
    translate([0,25,0])
        rotate([-90,0,90])BoltM3();
    translate([0,-50,0])
        rotate([-90,0,90])BoltM3();

}
translate([box[0]/-2 -3,-bottomLength/2,offsetY])
{
    translate([0,0,0])
        rotate([-90,0,90])BoltM3();


}
}
module side(length=140,heigth=50){
            
    //translate([0,0,box[2]/2])sideLeftHoles();

        translate([width/-2+caseThickness/-2 , (topLength-bottomLength)/2  ,box[2]/2 + caseThickness])
    difference(){        
        cube([caseThickness,topLength+bottomLength,box[2]],true);
    
    }
       *translate([width/2+caseThickness/2 , (topLength-bottomLength)/2  ,box[2]/2 + caseThickness])
            cube([caseThickness,topLength+bottomLength,50],true);

}
module sideRounded(length=140,heigth=50,r=caseThickness){
    
    translate([0,topLength + caseThickness/2 ,box[2]/2 + caseThickness])
    union(){
      
        cube([length,caseThickness,heigth],true);
        *translate([0,-3,heigth/2 - caseThickness/2 - caseThickness ])
            cube([length,3.5,3],true); 
        *translate([0,-3, caseThickness/2 + caseThickness  - heigth/2 ])
            cube([length,3.5,3],true); 
        
        for(i = [-1,1]){
        translate([i * length/2 ,-r + caseThickness/2,-heigth/2 ])
        difference(){
            cylinder(r=r,h=heigth);
            translate([-r,-r,-1])
                cube([2*r,2*r - caseThickness,heigth +5]);
           
        }
    }
}
}
// main file
use <case.scad>;
include <Metric/M3.scad>;


width = 140;
topLength = 120;
bottomLength = 75;
caseThickness = 3.5;
$fs = 0.5;
$fa = 2;
difference(){
    side(length=140,r=3.5);
    
    translate([0,3,17.5])
    rotate([-90,0,0])BoltM3();
    
    
    translate([0,3,-17.5])
    rotate([-90,0,0])BoltM3();
    
    
}
sideLeftHoles();

module sideLeftHoles(){
translate([topLength/2,20,0])
{
    translate([25,3,17.5])
        rotate([-90,0,0])#BoltM3();
    translate([-50,3,17.5])
        rotate([-90,0,0])#BoltM3();

}
translate([-bottomLength/2,20,0])
{
    translate([0,3,17.5])
        rotate([-90,0,0])#BoltM3();


}
}
